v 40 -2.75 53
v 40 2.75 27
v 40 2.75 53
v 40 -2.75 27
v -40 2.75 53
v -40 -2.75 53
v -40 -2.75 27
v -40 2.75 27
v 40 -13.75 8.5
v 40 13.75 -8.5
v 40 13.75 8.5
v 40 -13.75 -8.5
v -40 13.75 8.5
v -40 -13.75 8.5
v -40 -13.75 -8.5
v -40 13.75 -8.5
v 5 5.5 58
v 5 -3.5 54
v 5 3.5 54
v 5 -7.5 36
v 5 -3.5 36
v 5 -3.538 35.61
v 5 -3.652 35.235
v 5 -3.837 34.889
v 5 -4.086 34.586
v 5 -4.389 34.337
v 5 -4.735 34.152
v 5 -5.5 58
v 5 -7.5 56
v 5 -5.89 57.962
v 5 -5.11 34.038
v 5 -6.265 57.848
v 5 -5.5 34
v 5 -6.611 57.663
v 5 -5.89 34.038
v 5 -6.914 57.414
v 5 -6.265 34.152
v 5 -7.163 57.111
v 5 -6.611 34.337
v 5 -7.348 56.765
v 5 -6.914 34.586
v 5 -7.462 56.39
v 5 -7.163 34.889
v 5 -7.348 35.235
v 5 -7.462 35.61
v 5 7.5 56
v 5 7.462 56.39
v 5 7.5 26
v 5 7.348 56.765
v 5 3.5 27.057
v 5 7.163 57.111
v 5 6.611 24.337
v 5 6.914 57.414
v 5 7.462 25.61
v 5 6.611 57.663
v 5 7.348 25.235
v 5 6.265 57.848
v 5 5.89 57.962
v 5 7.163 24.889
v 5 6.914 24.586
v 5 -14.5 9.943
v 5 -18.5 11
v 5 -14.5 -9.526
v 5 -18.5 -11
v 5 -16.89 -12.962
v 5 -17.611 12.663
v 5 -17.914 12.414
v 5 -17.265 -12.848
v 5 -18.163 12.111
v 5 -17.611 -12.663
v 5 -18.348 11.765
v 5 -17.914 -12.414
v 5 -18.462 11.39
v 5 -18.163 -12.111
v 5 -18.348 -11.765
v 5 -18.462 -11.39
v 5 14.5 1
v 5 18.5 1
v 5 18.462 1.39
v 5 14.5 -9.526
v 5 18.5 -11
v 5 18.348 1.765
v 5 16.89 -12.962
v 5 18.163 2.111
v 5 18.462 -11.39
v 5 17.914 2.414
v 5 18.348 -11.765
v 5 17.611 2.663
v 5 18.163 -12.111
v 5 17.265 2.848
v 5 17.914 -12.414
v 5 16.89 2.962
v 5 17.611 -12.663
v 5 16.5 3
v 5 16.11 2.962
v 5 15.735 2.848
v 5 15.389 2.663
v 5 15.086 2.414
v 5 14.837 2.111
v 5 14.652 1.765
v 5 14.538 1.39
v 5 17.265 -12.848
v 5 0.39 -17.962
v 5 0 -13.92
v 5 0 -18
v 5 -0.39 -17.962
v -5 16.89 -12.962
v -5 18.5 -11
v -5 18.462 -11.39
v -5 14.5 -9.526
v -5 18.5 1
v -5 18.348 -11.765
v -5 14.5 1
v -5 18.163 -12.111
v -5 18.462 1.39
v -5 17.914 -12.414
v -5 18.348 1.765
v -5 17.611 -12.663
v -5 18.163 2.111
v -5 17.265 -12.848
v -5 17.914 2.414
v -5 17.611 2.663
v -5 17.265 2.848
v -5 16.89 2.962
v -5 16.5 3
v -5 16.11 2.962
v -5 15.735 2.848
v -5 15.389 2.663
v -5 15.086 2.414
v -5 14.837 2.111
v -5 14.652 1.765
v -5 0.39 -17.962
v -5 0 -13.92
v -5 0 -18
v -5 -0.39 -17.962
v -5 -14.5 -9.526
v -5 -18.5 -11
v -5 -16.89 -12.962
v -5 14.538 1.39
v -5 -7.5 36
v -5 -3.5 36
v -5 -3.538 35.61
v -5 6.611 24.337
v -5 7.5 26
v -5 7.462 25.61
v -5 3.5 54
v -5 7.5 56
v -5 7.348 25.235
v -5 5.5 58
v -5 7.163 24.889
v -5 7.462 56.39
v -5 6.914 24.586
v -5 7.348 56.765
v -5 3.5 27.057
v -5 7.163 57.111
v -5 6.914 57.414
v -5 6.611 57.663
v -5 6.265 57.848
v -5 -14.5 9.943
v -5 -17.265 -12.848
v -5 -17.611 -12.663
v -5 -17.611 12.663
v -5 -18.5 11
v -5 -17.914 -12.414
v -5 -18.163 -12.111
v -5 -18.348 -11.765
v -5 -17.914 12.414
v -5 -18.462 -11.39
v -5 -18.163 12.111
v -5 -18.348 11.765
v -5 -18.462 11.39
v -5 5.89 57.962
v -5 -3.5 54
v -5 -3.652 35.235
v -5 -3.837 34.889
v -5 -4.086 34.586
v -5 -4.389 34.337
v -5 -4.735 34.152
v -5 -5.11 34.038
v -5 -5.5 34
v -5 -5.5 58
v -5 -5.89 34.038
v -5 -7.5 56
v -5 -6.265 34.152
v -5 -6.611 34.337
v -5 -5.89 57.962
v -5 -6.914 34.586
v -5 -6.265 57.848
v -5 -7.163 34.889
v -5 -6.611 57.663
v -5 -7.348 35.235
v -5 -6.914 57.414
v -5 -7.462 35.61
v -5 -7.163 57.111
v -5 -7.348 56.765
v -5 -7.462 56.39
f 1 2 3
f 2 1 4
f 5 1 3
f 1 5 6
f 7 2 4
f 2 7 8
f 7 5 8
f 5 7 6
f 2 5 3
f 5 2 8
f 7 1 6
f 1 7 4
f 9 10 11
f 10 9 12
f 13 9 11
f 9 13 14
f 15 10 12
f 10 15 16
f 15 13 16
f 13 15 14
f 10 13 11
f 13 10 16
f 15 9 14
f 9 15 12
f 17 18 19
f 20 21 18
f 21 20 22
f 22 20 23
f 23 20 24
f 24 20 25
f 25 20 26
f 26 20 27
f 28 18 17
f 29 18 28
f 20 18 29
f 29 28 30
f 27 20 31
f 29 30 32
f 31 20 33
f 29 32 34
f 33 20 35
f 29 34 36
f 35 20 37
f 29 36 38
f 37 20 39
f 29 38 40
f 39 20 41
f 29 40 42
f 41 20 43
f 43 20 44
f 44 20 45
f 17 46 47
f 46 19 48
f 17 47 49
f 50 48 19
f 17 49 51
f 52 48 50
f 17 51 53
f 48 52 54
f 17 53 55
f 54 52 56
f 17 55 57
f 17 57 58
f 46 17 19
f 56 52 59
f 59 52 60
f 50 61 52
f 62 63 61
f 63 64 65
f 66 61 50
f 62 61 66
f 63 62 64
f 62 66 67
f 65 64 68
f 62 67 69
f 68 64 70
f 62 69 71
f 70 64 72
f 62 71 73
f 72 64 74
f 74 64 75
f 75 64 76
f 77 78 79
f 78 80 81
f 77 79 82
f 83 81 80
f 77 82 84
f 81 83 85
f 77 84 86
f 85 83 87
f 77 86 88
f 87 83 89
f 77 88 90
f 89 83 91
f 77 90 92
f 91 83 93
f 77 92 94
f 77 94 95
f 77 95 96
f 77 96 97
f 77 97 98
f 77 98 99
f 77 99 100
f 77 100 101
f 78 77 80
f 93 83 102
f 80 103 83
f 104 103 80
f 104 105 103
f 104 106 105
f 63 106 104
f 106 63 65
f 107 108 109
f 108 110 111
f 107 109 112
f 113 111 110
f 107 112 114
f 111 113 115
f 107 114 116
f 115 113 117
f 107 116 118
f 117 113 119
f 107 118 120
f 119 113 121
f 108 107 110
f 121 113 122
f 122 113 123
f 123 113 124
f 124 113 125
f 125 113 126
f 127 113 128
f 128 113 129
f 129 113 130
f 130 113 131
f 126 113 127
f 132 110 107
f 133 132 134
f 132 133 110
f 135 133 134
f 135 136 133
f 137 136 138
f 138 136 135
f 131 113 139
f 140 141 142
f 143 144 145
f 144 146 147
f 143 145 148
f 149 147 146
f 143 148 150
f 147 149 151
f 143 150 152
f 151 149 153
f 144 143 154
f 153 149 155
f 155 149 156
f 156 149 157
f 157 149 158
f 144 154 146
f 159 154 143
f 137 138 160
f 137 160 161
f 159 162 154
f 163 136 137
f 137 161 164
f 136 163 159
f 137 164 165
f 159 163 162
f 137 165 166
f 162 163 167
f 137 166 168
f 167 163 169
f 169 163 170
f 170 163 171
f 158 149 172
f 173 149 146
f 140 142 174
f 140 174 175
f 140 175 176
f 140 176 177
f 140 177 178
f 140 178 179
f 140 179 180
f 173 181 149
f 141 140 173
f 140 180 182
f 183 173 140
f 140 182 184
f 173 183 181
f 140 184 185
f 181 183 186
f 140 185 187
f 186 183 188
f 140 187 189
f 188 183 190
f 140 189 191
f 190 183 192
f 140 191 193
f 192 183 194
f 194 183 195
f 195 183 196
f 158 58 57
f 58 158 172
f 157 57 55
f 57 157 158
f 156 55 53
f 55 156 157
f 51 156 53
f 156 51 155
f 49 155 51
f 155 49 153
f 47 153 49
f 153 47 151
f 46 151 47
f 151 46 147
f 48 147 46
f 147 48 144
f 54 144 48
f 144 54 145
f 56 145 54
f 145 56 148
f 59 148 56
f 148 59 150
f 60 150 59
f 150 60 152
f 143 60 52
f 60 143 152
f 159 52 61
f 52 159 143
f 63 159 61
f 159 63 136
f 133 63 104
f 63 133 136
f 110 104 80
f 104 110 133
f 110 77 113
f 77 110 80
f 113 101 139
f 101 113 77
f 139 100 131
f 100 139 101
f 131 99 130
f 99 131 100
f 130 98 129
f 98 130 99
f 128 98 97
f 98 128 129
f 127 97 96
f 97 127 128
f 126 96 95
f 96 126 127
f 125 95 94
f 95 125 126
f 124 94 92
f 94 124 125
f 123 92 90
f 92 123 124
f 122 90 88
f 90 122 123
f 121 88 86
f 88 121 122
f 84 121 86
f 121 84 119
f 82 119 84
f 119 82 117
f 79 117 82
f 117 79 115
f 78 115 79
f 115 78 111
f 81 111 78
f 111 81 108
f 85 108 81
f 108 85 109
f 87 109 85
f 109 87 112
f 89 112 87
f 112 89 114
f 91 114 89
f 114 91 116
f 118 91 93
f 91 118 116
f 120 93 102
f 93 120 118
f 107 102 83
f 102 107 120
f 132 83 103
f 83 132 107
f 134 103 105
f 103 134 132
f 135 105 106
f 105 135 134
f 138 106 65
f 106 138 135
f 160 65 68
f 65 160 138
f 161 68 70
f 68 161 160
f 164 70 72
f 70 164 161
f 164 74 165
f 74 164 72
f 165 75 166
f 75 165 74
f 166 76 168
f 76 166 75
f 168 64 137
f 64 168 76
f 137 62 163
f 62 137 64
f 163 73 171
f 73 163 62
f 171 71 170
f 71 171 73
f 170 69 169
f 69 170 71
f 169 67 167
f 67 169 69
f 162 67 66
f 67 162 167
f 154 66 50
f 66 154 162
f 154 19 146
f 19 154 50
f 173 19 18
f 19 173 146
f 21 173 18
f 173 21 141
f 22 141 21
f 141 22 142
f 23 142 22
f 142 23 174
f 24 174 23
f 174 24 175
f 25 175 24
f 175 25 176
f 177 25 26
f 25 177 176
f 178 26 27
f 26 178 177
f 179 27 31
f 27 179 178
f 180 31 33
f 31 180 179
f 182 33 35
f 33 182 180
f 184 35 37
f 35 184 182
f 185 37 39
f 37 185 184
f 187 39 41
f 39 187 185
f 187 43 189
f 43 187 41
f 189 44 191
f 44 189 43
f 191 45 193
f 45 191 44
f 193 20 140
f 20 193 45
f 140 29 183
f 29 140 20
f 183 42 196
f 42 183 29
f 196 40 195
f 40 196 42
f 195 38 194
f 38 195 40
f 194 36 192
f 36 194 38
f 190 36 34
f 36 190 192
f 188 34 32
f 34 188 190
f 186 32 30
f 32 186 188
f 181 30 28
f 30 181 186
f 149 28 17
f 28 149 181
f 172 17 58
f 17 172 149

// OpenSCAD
// file: ../parts/hanger_soup_maker.scad
$fa = 1;

thick = 4;
x_top = 11/2;
x_bottom = 33/2;
y_bottom = 67;

module hanger() {
    pts = [
        [-x_top,20],
        [-x_top,0],
        [x_top,0],
        [x_top,30],
        [-x_bottom,45],
        [-x_bottom,y_bottom],
        [0,y_bottom+5],
        [x_bottom,y_bottom],
        [x_bottom,y_bottom-12],
    ];

    linear_extrude(10, center = true)
    for (p = [0:7]) {
        hull() {
            translate(pts[p]) circle(d = thick, center = true);
            translate(pts[p+1]) circle(d = thick, center = true);
        }
    }
}

hanger();
// file: ../vitamins/handle_soup_cooker.scad
module handle_cooker() {
    cube([80, 27.5, 17], center = true);
}
// file: ../vitamins/handle_kitchen_cabinet.scad
module handle_cabinet() {
    cube([80, 5.5, 26], center = true);
}
// main file
use <../vitamins/handle_kitchen_cabinet.scad>;
use <../vitamins/handle_soup_cooker.scad>;
use <../parts/hanger_soup_maker.scad>;

$fa = 1; // minimum angle
$fs = 0.4; // minimum size

translate([0,0,40])
handle_cabinet();
handle_cooker();

color("green")
translate([0,0,56])
rotate([-90,0,90])
hanger();
